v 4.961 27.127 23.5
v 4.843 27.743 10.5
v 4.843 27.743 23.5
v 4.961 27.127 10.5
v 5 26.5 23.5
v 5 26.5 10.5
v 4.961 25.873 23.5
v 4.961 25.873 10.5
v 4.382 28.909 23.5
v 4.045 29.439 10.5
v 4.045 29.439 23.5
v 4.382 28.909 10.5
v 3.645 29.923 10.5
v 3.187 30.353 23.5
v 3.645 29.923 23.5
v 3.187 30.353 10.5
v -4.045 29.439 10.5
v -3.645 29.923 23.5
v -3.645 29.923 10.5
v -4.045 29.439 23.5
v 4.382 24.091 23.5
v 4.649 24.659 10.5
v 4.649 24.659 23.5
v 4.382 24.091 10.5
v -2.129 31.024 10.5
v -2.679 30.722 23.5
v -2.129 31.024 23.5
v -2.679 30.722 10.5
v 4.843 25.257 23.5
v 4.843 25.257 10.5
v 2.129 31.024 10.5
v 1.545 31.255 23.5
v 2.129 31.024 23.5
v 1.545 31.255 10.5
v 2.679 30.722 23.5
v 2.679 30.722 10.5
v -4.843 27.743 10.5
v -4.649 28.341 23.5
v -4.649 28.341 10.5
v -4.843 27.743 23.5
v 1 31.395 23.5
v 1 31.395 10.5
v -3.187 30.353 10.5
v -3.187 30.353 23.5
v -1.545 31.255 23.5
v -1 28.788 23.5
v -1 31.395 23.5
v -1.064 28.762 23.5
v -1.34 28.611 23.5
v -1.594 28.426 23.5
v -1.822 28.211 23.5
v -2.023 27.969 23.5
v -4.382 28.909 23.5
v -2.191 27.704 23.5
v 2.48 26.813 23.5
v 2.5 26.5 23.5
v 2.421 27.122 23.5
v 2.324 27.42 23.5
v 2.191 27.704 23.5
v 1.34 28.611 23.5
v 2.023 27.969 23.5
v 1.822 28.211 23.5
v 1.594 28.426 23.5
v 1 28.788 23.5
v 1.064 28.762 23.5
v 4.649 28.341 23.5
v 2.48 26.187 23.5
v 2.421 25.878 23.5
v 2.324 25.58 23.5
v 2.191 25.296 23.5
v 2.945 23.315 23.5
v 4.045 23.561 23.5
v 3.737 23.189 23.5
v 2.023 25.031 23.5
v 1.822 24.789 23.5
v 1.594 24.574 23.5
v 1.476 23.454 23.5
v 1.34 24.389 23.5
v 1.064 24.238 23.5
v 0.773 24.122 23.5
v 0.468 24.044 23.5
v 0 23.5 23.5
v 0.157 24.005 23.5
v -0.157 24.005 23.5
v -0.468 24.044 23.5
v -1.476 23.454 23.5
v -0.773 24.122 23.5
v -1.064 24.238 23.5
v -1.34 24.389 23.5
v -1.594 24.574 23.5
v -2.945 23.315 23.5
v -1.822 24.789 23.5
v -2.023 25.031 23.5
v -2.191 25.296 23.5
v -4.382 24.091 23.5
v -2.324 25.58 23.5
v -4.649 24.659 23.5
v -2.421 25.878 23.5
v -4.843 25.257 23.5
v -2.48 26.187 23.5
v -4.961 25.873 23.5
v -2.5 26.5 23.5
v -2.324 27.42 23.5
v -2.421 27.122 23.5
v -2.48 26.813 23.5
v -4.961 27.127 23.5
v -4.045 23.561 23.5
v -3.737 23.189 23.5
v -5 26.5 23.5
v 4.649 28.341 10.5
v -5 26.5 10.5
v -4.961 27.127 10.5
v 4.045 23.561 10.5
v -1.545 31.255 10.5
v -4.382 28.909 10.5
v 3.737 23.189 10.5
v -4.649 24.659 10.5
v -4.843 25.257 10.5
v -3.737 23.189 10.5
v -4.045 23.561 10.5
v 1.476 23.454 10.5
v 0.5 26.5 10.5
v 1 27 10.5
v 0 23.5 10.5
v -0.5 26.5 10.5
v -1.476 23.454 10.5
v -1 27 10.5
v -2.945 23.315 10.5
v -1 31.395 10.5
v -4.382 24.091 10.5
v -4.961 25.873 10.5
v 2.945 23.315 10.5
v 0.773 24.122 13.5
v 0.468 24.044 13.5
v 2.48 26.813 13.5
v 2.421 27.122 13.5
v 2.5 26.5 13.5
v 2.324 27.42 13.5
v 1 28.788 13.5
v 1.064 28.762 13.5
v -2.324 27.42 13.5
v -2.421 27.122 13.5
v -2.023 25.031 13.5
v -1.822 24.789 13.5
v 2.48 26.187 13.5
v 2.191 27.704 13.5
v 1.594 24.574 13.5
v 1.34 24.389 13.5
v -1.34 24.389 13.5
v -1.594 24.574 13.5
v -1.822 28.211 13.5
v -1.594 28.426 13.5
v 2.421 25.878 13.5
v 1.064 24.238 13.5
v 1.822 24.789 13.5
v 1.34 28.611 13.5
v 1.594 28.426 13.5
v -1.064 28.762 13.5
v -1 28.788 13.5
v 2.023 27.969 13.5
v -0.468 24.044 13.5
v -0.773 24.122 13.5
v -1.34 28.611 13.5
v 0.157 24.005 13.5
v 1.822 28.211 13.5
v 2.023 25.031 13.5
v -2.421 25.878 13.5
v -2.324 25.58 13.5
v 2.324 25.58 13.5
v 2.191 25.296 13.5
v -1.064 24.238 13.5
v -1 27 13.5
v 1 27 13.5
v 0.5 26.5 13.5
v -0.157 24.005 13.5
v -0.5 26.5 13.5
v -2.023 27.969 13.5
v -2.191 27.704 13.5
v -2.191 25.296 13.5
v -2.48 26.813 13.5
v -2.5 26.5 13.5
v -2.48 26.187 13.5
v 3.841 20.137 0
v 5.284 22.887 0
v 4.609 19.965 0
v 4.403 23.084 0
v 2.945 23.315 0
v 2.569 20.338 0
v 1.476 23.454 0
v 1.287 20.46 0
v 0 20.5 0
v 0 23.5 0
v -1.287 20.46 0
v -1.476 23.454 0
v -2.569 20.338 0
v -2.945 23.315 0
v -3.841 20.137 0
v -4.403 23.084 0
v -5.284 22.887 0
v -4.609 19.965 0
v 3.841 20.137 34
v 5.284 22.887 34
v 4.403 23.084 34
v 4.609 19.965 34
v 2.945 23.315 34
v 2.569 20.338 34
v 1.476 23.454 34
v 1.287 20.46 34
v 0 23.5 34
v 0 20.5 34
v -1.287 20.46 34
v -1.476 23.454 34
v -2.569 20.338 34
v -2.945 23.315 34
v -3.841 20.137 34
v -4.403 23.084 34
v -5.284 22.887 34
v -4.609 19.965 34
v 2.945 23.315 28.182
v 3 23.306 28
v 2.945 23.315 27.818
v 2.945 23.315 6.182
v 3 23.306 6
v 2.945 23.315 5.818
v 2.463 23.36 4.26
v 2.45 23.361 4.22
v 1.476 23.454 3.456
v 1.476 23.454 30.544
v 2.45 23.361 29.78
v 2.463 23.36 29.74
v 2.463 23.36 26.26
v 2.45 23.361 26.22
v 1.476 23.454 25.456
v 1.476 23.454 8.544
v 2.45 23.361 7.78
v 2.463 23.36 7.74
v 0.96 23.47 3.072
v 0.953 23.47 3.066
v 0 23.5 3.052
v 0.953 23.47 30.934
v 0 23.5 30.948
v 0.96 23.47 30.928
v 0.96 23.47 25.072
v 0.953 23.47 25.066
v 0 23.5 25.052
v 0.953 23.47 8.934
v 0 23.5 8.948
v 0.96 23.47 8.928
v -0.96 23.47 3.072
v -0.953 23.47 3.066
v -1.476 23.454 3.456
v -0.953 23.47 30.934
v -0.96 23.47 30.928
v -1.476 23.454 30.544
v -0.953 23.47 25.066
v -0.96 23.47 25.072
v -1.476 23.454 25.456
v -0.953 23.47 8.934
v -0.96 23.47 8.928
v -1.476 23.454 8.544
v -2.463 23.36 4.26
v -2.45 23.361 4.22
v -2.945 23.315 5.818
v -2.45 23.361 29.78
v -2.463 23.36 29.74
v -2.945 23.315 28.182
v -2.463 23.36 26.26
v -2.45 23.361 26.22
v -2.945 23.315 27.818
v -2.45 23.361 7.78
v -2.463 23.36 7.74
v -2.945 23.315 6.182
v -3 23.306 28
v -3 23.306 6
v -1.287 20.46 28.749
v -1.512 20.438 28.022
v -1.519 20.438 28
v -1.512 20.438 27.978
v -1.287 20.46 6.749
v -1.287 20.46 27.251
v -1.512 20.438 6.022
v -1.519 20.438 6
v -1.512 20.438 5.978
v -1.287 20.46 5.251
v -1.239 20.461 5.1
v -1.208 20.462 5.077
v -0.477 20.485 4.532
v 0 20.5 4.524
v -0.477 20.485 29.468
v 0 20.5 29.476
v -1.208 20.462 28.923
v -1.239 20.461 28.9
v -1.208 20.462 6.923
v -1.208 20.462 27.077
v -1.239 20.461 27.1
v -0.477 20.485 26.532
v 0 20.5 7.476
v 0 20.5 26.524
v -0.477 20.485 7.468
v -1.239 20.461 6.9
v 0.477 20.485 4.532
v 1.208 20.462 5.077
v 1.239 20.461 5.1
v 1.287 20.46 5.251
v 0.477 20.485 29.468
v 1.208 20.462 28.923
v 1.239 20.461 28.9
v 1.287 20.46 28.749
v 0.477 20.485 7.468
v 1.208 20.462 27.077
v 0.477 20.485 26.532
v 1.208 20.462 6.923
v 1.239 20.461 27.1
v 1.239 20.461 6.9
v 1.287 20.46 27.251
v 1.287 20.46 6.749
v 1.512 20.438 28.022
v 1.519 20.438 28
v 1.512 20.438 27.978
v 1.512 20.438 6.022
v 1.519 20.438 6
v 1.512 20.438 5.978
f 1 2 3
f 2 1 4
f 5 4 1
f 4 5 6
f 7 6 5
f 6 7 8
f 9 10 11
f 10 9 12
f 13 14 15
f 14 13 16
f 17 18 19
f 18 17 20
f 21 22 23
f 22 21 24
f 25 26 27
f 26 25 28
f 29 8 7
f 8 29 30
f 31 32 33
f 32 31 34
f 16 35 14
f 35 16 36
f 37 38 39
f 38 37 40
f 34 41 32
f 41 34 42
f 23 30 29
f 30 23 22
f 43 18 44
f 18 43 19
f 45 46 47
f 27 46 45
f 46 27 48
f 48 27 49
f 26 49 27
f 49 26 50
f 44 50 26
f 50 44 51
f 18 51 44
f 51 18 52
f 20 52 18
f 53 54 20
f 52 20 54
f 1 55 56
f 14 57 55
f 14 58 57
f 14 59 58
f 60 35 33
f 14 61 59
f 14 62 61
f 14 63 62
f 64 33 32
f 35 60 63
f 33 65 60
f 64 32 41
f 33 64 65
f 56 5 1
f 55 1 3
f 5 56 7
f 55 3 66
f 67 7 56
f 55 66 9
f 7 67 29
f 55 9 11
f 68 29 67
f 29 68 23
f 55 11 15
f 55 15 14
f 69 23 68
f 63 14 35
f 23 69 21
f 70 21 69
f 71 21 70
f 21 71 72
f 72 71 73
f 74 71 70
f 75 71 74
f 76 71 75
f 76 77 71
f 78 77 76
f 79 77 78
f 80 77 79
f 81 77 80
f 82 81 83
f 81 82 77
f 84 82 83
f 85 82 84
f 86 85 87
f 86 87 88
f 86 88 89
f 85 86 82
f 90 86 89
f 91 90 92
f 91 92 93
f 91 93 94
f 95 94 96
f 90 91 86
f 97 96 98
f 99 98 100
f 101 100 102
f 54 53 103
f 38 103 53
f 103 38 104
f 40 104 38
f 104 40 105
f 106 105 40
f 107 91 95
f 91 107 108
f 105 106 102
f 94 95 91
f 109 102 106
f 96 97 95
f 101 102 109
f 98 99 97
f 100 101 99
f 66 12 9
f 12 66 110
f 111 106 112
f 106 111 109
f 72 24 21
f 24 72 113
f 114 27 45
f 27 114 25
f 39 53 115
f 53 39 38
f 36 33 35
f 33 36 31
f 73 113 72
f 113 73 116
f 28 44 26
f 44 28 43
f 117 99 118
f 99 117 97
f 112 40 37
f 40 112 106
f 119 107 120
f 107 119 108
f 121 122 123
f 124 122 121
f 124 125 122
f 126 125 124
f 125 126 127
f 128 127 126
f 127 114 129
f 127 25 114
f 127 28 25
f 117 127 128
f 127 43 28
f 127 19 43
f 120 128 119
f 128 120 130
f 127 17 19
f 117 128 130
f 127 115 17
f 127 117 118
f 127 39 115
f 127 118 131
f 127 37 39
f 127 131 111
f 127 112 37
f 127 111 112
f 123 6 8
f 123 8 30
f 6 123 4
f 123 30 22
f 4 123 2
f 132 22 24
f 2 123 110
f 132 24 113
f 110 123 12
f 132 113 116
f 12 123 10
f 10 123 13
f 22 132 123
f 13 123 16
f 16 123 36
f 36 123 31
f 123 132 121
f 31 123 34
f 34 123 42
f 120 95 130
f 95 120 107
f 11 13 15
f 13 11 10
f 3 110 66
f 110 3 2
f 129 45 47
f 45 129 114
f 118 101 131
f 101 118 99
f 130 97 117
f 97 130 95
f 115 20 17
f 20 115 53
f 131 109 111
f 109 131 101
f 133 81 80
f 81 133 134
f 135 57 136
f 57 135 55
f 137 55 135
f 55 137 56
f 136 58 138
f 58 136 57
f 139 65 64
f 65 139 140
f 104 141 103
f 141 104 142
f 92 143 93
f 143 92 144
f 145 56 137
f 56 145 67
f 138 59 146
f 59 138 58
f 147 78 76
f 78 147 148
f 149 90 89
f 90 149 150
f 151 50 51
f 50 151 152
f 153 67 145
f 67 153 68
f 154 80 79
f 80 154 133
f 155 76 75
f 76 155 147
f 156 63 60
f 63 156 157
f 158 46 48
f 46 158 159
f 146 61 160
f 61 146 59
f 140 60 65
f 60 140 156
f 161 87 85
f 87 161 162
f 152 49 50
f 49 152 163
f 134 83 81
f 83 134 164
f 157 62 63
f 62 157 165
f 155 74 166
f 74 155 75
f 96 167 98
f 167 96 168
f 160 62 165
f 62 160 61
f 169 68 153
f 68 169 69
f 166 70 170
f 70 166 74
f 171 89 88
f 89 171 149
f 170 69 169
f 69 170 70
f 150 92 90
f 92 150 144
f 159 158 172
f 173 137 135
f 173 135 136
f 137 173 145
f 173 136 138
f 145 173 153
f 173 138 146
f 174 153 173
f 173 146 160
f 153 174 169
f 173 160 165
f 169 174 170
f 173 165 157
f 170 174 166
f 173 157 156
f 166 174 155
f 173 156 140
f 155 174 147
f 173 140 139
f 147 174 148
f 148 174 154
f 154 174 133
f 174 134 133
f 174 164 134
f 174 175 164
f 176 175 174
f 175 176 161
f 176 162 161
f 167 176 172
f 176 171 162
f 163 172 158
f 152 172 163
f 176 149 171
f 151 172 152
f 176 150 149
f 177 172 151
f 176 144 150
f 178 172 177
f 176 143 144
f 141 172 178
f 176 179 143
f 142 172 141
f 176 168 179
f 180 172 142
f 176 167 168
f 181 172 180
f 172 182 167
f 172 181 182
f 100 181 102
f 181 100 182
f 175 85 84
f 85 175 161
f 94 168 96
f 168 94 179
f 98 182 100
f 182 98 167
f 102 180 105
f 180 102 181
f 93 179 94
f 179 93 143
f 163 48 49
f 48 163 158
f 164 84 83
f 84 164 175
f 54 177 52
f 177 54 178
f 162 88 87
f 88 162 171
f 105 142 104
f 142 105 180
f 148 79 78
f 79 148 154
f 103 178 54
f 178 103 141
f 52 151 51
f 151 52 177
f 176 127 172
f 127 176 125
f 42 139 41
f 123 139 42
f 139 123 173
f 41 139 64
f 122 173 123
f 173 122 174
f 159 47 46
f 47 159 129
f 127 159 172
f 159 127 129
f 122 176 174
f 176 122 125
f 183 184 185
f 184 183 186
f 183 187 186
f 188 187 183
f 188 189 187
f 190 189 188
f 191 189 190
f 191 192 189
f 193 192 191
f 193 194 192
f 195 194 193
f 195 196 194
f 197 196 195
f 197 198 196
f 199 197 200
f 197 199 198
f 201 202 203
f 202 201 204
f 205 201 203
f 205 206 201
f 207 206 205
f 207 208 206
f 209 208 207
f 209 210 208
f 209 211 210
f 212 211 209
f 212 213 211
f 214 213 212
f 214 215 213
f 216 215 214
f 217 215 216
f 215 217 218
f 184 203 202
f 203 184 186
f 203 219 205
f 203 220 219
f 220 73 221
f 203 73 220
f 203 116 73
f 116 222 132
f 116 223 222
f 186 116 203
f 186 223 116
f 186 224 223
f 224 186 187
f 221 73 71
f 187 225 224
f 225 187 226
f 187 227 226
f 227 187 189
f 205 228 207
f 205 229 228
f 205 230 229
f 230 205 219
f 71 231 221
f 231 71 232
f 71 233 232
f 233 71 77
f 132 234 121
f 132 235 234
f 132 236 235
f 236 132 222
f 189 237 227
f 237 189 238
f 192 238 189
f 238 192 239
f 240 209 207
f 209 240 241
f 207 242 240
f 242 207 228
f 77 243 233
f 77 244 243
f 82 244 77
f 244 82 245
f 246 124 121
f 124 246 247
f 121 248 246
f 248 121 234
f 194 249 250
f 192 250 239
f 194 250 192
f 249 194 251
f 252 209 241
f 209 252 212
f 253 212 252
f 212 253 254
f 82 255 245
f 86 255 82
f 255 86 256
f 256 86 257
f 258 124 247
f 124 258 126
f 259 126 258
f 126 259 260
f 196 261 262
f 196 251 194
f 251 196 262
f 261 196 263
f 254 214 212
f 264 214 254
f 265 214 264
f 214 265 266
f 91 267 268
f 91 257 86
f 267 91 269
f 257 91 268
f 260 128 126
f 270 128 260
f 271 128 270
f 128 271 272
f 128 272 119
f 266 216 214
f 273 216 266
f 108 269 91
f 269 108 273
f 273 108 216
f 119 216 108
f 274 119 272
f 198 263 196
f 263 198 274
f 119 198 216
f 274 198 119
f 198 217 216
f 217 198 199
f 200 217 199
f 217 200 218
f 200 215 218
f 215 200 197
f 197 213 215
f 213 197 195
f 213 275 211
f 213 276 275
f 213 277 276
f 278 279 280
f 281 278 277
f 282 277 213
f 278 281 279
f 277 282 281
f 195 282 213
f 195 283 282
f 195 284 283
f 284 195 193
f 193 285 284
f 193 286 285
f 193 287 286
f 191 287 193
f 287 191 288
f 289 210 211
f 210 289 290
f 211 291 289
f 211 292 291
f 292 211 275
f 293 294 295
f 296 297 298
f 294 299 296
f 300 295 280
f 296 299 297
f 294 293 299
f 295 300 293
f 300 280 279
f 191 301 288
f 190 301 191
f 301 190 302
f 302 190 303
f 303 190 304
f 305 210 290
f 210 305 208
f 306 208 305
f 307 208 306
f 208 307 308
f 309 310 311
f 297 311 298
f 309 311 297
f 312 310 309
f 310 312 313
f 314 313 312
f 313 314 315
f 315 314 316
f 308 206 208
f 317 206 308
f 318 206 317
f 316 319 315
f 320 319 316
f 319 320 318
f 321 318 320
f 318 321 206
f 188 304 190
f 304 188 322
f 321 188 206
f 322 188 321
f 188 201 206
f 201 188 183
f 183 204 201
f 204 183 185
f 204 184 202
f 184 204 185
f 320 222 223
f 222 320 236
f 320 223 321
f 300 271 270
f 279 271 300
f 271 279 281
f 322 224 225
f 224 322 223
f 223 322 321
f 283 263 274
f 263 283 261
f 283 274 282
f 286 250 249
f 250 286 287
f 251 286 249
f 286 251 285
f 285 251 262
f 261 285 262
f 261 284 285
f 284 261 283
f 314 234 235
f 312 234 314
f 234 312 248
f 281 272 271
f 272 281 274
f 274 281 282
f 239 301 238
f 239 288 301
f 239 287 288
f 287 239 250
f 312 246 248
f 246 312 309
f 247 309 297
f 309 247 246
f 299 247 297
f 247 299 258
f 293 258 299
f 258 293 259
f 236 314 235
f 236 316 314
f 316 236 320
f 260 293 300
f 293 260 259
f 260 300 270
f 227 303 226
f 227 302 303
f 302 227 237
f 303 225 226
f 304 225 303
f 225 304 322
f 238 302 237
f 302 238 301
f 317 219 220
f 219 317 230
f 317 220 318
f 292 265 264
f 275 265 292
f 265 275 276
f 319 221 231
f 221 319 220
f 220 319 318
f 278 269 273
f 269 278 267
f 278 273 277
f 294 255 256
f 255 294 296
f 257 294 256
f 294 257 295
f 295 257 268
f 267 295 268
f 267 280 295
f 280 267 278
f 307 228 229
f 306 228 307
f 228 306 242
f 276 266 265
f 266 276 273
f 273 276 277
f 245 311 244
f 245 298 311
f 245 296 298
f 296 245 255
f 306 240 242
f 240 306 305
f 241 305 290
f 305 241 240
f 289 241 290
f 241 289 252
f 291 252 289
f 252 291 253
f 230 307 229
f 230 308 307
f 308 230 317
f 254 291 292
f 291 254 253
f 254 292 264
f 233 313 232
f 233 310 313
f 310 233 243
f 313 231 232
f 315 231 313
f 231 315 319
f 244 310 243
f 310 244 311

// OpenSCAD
// big - frame clamp, rng - cable clamp

D_BIG = 41; //mm the frame tube

H_BIG = 3; //mm the frame clamp thickness

D_CAB = 5; //mm shifter cable housing

D_RNG =  10; //mm the diameter of the cable clamp

L_RNG = 12+1; // the length of the cable clamp

L_BIG = D_RNG + 24; // mm len the frame clamp

module sector(radius, angles, fn = 24) {
    r = radius / cos(180 / fn);
    step = -360 / fn;

    points = concat([[0, 0]],
        [for(a = [angles[0] : step : angles[1] - 360]) 
            [r * cos(a), r * sin(a)]
        ],
        [[r * cos(angles[1]), r * sin(angles[1])]]
    );

    difference() {
        circle(radius, $fn = fn);
        polygon(points);
    }
}

module arc(radius, angles, width = 1, fn = 24) {
    difference() {
        sector(radius + width, angles, fn);
        sector(radius, angles, fn);
    }
} 


//
difference() {
union() {
    // the tube clamp
    linear_extrude(L_BIG) 
       arc(D_BIG/2, [80-3, 100+3], H_BIG, fn=100);

    // the cable clamp (outer-inner)
    translate([0, D_BIG/2 + D_RNG/2 +1, (L_BIG-L_RNG)/2])
    difference(){
    //color("red"){
        //the outer ring
        cylinder(d=D_RNG, h=L_RNG,$fn=50);
        // the inner ring cutout
        translate([0,0,3]) cylinder(d=D_CAB, h=L_RNG, $fn=50);
        //the cable space cutout .. should be 1mm instead of two
        //TODO: round
        //translate([-1,0,0]) cube([2,10,L_RNG]);
        translate([-1,0,0]) linear_extrude(height=L_RNG) offset(0.5) offset(-0.5) square([2,10]);
    }
}


// the screw cutouts
union() {

SPACE = 6;
R1=6.2/2;
R2=3/2; // can be a bit less
H=3.1;
translate([0,D_BIG/2+H_BIG,SPACE]) rotate([90,0,0])
cylinder( h=H,r1=R1,r2=R2);

translate([0,D_BIG/2+H_BIG,L_BIG-SPACE]) rotate([90,0,0])
cylinder( h=H,r1=R1,r2=R2);
}
}
